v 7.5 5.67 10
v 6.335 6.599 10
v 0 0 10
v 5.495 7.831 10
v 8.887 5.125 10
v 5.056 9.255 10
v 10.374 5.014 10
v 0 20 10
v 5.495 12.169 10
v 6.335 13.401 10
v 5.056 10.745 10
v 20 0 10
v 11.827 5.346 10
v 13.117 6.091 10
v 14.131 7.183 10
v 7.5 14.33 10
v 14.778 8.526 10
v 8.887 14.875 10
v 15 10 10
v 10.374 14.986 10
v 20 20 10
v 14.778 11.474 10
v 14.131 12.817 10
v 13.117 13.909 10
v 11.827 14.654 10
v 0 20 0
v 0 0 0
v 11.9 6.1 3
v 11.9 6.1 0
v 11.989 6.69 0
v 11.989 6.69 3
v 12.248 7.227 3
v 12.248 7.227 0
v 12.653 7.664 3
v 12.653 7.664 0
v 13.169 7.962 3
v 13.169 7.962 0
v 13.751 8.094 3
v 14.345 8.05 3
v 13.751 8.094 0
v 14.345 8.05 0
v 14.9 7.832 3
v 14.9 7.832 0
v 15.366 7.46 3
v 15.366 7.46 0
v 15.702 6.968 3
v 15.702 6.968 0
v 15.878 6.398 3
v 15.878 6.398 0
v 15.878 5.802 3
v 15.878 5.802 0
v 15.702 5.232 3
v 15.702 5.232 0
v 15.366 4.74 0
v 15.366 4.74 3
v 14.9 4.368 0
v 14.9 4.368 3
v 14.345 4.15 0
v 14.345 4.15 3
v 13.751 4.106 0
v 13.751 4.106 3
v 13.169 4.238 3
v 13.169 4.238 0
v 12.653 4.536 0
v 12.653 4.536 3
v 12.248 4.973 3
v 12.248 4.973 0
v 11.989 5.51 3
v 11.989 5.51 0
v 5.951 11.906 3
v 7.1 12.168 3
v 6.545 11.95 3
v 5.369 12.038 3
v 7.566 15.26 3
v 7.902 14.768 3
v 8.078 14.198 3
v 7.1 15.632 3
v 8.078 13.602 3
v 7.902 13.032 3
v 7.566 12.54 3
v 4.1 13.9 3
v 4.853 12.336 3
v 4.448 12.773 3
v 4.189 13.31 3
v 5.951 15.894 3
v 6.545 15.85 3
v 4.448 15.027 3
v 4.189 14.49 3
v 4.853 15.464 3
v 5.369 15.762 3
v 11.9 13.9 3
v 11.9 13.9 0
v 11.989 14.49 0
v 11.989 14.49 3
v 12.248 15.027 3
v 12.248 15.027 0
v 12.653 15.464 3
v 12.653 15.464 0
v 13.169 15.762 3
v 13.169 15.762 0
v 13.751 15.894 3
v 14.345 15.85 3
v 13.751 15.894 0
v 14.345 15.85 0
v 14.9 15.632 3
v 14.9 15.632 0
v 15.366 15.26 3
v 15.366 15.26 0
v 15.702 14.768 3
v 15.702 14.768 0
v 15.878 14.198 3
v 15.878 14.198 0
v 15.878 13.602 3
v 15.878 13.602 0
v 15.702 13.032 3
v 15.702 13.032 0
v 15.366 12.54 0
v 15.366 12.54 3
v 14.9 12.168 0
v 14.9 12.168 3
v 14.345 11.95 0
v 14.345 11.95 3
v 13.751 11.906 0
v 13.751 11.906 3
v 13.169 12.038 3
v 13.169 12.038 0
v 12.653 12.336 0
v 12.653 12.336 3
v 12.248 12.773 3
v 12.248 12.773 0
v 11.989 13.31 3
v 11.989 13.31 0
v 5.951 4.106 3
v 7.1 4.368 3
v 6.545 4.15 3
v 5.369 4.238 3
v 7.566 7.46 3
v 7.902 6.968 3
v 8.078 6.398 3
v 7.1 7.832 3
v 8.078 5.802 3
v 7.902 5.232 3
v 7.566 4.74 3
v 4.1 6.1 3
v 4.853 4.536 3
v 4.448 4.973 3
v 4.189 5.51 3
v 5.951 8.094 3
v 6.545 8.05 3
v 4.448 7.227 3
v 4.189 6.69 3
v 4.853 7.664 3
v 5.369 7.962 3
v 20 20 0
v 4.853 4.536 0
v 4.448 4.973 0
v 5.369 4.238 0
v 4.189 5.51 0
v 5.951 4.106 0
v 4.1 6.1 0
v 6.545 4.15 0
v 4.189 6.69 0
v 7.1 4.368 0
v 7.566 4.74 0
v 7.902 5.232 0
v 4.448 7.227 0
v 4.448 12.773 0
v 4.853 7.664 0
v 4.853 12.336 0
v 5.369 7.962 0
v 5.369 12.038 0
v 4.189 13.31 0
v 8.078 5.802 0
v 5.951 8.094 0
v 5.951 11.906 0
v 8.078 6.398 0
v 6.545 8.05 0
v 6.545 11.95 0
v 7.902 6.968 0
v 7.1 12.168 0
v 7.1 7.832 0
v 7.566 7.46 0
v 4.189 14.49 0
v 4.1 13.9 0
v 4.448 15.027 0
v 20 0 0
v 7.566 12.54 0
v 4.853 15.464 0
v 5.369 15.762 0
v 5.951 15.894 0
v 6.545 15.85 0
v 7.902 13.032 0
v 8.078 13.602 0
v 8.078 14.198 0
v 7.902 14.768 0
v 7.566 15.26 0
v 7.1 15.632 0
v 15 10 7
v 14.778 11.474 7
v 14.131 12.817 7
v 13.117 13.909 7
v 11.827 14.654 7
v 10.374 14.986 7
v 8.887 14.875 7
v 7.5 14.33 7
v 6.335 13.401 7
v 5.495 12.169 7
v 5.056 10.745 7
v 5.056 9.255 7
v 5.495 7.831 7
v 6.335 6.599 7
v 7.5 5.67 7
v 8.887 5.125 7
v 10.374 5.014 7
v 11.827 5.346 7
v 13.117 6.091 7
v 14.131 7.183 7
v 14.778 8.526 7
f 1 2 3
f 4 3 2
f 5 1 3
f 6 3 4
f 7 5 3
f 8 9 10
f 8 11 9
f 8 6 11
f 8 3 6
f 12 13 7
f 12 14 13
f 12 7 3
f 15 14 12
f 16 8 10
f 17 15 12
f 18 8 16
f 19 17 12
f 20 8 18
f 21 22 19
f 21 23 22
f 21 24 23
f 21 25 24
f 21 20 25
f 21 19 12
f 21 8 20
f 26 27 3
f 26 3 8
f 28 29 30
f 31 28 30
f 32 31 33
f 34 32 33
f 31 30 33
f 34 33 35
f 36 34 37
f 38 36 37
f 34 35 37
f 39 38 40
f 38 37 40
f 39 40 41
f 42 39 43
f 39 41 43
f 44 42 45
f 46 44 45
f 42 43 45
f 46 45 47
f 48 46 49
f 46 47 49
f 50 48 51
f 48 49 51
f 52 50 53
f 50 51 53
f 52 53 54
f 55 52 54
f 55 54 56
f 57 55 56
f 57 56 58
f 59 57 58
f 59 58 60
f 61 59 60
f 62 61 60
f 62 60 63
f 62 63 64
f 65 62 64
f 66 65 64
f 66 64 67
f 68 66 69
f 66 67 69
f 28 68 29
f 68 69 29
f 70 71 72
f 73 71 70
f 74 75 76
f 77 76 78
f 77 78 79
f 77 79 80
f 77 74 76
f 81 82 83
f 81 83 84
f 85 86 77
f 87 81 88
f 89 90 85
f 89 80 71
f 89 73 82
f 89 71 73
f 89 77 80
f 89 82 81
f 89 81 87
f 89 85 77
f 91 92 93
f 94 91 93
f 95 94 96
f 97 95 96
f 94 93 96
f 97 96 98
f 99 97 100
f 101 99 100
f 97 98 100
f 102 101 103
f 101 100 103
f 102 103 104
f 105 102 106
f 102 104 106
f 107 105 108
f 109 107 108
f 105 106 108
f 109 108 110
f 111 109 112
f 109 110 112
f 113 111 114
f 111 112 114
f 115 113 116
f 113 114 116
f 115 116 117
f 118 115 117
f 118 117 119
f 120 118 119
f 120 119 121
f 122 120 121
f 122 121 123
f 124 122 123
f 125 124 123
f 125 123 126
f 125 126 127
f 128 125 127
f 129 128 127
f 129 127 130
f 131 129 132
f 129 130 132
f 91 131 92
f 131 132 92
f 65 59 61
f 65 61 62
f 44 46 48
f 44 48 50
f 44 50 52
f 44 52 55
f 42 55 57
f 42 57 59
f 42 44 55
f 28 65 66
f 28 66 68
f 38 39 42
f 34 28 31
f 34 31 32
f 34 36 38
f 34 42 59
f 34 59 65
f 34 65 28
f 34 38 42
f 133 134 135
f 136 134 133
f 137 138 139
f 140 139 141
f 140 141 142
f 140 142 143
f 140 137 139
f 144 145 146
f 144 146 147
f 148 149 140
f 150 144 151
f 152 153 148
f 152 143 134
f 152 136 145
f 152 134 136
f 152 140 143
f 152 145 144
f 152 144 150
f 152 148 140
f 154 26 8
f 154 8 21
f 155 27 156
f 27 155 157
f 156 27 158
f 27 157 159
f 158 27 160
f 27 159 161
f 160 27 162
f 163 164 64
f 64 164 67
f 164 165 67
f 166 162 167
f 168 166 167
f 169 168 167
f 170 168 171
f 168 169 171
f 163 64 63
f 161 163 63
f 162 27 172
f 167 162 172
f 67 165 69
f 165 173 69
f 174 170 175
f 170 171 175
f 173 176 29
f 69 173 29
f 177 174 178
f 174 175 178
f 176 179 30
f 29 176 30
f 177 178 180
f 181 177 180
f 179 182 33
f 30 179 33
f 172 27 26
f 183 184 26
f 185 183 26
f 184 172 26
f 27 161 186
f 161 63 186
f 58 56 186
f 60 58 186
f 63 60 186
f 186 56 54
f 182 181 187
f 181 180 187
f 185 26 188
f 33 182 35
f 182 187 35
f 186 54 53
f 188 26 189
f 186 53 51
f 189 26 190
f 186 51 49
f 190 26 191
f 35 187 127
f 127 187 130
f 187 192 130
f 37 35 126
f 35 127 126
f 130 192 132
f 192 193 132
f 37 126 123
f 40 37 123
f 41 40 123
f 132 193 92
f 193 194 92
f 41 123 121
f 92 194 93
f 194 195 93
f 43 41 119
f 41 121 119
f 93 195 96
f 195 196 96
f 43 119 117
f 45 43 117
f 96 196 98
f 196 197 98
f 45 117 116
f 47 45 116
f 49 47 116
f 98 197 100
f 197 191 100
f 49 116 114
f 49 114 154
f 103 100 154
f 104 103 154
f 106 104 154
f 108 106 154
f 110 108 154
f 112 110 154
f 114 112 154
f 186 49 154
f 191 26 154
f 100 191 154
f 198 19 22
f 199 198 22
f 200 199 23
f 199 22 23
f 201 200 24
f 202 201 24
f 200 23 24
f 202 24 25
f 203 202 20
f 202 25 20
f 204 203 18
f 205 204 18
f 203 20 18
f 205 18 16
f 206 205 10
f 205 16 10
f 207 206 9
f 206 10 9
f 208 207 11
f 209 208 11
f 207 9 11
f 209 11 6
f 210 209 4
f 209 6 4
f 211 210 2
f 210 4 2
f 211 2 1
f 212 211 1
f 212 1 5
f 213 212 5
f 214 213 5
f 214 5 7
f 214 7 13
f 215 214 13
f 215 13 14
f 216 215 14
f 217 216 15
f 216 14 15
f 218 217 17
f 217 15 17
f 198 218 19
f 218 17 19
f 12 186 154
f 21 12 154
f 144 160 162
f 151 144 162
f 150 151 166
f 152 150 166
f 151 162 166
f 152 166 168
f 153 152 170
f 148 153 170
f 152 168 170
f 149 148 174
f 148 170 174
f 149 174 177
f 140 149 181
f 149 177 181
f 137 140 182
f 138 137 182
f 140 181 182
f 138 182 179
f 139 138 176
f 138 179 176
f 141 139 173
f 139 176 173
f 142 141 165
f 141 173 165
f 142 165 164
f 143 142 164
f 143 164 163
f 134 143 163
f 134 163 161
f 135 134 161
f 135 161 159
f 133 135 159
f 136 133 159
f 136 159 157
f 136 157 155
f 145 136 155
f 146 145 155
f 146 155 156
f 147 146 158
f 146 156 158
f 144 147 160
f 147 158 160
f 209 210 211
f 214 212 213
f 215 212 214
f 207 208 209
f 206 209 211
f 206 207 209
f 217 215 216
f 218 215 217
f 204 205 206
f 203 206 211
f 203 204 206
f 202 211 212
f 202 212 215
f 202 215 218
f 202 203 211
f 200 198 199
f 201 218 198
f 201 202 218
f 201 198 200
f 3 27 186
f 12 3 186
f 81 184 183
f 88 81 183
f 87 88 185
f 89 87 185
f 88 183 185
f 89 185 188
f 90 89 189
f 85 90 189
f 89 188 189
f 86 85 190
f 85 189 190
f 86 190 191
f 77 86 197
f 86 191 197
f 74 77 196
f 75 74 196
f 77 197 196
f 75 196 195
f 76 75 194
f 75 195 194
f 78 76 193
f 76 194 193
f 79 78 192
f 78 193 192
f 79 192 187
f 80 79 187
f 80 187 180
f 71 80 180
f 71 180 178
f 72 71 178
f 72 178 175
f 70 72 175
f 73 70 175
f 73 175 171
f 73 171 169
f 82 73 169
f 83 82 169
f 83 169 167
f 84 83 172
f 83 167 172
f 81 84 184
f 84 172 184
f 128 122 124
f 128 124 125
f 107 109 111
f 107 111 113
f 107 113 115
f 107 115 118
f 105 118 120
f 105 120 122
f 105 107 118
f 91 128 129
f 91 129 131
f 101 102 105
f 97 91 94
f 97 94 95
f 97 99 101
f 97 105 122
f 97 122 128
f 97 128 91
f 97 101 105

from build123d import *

# Parameters (mm, degrees)
SKETCH1_W           = 20
SKETCH1_H           = 20
BOSS_EXTRUDE1_DEPTH = 10
SKETCH2_R           = 5
CUT_EXTRUDE1_DEPTH  = 3
SKETCH3_R           = 2
CUT_EXTRUDE2_DEPTH  = 3


with BuildPart() as part:
    # Sketch1 → Boss-Extrude1 (new body)
    with BuildSketch(Plane.XY):
        with Locations((10, 10)):
            Rectangle(SKETCH1_W, SKETCH1_H)
    extrude(amount=BOSS_EXTRUDE1_DEPTH)

    # Sketch2 → Cut-Extrude1 (cut)
    with BuildSketch(Plane.XY.offset(10)):
        with Locations((10, 10)):
            Circle(SKETCH2_R)
    extrude(amount=-CUT_EXTRUDE1_DEPTH, mode=Mode.SUBTRACT)

    # Sketch3 → Cut-Extrude2 (cut)
    with BuildSketch(Plane(origin=(0, 0, 0), x_dir=(-1, 0, 0), z_dir=(0, 0, -1))):
        with Locations((-13.9, 13.9)):
            Circle(SKETCH3_R)
        with Locations((-6.1, 13.9)):
            Circle(SKETCH3_R)
        with Locations((-13.9, 6.1)):
            Circle(SKETCH3_R)
        with Locations((-6.1, 6.1)):
            Circle(SKETCH3_R)
    extrude(amount=-CUT_EXTRUDE2_DEPTH, mode=Mode.SUBTRACT)


solid = part.part
